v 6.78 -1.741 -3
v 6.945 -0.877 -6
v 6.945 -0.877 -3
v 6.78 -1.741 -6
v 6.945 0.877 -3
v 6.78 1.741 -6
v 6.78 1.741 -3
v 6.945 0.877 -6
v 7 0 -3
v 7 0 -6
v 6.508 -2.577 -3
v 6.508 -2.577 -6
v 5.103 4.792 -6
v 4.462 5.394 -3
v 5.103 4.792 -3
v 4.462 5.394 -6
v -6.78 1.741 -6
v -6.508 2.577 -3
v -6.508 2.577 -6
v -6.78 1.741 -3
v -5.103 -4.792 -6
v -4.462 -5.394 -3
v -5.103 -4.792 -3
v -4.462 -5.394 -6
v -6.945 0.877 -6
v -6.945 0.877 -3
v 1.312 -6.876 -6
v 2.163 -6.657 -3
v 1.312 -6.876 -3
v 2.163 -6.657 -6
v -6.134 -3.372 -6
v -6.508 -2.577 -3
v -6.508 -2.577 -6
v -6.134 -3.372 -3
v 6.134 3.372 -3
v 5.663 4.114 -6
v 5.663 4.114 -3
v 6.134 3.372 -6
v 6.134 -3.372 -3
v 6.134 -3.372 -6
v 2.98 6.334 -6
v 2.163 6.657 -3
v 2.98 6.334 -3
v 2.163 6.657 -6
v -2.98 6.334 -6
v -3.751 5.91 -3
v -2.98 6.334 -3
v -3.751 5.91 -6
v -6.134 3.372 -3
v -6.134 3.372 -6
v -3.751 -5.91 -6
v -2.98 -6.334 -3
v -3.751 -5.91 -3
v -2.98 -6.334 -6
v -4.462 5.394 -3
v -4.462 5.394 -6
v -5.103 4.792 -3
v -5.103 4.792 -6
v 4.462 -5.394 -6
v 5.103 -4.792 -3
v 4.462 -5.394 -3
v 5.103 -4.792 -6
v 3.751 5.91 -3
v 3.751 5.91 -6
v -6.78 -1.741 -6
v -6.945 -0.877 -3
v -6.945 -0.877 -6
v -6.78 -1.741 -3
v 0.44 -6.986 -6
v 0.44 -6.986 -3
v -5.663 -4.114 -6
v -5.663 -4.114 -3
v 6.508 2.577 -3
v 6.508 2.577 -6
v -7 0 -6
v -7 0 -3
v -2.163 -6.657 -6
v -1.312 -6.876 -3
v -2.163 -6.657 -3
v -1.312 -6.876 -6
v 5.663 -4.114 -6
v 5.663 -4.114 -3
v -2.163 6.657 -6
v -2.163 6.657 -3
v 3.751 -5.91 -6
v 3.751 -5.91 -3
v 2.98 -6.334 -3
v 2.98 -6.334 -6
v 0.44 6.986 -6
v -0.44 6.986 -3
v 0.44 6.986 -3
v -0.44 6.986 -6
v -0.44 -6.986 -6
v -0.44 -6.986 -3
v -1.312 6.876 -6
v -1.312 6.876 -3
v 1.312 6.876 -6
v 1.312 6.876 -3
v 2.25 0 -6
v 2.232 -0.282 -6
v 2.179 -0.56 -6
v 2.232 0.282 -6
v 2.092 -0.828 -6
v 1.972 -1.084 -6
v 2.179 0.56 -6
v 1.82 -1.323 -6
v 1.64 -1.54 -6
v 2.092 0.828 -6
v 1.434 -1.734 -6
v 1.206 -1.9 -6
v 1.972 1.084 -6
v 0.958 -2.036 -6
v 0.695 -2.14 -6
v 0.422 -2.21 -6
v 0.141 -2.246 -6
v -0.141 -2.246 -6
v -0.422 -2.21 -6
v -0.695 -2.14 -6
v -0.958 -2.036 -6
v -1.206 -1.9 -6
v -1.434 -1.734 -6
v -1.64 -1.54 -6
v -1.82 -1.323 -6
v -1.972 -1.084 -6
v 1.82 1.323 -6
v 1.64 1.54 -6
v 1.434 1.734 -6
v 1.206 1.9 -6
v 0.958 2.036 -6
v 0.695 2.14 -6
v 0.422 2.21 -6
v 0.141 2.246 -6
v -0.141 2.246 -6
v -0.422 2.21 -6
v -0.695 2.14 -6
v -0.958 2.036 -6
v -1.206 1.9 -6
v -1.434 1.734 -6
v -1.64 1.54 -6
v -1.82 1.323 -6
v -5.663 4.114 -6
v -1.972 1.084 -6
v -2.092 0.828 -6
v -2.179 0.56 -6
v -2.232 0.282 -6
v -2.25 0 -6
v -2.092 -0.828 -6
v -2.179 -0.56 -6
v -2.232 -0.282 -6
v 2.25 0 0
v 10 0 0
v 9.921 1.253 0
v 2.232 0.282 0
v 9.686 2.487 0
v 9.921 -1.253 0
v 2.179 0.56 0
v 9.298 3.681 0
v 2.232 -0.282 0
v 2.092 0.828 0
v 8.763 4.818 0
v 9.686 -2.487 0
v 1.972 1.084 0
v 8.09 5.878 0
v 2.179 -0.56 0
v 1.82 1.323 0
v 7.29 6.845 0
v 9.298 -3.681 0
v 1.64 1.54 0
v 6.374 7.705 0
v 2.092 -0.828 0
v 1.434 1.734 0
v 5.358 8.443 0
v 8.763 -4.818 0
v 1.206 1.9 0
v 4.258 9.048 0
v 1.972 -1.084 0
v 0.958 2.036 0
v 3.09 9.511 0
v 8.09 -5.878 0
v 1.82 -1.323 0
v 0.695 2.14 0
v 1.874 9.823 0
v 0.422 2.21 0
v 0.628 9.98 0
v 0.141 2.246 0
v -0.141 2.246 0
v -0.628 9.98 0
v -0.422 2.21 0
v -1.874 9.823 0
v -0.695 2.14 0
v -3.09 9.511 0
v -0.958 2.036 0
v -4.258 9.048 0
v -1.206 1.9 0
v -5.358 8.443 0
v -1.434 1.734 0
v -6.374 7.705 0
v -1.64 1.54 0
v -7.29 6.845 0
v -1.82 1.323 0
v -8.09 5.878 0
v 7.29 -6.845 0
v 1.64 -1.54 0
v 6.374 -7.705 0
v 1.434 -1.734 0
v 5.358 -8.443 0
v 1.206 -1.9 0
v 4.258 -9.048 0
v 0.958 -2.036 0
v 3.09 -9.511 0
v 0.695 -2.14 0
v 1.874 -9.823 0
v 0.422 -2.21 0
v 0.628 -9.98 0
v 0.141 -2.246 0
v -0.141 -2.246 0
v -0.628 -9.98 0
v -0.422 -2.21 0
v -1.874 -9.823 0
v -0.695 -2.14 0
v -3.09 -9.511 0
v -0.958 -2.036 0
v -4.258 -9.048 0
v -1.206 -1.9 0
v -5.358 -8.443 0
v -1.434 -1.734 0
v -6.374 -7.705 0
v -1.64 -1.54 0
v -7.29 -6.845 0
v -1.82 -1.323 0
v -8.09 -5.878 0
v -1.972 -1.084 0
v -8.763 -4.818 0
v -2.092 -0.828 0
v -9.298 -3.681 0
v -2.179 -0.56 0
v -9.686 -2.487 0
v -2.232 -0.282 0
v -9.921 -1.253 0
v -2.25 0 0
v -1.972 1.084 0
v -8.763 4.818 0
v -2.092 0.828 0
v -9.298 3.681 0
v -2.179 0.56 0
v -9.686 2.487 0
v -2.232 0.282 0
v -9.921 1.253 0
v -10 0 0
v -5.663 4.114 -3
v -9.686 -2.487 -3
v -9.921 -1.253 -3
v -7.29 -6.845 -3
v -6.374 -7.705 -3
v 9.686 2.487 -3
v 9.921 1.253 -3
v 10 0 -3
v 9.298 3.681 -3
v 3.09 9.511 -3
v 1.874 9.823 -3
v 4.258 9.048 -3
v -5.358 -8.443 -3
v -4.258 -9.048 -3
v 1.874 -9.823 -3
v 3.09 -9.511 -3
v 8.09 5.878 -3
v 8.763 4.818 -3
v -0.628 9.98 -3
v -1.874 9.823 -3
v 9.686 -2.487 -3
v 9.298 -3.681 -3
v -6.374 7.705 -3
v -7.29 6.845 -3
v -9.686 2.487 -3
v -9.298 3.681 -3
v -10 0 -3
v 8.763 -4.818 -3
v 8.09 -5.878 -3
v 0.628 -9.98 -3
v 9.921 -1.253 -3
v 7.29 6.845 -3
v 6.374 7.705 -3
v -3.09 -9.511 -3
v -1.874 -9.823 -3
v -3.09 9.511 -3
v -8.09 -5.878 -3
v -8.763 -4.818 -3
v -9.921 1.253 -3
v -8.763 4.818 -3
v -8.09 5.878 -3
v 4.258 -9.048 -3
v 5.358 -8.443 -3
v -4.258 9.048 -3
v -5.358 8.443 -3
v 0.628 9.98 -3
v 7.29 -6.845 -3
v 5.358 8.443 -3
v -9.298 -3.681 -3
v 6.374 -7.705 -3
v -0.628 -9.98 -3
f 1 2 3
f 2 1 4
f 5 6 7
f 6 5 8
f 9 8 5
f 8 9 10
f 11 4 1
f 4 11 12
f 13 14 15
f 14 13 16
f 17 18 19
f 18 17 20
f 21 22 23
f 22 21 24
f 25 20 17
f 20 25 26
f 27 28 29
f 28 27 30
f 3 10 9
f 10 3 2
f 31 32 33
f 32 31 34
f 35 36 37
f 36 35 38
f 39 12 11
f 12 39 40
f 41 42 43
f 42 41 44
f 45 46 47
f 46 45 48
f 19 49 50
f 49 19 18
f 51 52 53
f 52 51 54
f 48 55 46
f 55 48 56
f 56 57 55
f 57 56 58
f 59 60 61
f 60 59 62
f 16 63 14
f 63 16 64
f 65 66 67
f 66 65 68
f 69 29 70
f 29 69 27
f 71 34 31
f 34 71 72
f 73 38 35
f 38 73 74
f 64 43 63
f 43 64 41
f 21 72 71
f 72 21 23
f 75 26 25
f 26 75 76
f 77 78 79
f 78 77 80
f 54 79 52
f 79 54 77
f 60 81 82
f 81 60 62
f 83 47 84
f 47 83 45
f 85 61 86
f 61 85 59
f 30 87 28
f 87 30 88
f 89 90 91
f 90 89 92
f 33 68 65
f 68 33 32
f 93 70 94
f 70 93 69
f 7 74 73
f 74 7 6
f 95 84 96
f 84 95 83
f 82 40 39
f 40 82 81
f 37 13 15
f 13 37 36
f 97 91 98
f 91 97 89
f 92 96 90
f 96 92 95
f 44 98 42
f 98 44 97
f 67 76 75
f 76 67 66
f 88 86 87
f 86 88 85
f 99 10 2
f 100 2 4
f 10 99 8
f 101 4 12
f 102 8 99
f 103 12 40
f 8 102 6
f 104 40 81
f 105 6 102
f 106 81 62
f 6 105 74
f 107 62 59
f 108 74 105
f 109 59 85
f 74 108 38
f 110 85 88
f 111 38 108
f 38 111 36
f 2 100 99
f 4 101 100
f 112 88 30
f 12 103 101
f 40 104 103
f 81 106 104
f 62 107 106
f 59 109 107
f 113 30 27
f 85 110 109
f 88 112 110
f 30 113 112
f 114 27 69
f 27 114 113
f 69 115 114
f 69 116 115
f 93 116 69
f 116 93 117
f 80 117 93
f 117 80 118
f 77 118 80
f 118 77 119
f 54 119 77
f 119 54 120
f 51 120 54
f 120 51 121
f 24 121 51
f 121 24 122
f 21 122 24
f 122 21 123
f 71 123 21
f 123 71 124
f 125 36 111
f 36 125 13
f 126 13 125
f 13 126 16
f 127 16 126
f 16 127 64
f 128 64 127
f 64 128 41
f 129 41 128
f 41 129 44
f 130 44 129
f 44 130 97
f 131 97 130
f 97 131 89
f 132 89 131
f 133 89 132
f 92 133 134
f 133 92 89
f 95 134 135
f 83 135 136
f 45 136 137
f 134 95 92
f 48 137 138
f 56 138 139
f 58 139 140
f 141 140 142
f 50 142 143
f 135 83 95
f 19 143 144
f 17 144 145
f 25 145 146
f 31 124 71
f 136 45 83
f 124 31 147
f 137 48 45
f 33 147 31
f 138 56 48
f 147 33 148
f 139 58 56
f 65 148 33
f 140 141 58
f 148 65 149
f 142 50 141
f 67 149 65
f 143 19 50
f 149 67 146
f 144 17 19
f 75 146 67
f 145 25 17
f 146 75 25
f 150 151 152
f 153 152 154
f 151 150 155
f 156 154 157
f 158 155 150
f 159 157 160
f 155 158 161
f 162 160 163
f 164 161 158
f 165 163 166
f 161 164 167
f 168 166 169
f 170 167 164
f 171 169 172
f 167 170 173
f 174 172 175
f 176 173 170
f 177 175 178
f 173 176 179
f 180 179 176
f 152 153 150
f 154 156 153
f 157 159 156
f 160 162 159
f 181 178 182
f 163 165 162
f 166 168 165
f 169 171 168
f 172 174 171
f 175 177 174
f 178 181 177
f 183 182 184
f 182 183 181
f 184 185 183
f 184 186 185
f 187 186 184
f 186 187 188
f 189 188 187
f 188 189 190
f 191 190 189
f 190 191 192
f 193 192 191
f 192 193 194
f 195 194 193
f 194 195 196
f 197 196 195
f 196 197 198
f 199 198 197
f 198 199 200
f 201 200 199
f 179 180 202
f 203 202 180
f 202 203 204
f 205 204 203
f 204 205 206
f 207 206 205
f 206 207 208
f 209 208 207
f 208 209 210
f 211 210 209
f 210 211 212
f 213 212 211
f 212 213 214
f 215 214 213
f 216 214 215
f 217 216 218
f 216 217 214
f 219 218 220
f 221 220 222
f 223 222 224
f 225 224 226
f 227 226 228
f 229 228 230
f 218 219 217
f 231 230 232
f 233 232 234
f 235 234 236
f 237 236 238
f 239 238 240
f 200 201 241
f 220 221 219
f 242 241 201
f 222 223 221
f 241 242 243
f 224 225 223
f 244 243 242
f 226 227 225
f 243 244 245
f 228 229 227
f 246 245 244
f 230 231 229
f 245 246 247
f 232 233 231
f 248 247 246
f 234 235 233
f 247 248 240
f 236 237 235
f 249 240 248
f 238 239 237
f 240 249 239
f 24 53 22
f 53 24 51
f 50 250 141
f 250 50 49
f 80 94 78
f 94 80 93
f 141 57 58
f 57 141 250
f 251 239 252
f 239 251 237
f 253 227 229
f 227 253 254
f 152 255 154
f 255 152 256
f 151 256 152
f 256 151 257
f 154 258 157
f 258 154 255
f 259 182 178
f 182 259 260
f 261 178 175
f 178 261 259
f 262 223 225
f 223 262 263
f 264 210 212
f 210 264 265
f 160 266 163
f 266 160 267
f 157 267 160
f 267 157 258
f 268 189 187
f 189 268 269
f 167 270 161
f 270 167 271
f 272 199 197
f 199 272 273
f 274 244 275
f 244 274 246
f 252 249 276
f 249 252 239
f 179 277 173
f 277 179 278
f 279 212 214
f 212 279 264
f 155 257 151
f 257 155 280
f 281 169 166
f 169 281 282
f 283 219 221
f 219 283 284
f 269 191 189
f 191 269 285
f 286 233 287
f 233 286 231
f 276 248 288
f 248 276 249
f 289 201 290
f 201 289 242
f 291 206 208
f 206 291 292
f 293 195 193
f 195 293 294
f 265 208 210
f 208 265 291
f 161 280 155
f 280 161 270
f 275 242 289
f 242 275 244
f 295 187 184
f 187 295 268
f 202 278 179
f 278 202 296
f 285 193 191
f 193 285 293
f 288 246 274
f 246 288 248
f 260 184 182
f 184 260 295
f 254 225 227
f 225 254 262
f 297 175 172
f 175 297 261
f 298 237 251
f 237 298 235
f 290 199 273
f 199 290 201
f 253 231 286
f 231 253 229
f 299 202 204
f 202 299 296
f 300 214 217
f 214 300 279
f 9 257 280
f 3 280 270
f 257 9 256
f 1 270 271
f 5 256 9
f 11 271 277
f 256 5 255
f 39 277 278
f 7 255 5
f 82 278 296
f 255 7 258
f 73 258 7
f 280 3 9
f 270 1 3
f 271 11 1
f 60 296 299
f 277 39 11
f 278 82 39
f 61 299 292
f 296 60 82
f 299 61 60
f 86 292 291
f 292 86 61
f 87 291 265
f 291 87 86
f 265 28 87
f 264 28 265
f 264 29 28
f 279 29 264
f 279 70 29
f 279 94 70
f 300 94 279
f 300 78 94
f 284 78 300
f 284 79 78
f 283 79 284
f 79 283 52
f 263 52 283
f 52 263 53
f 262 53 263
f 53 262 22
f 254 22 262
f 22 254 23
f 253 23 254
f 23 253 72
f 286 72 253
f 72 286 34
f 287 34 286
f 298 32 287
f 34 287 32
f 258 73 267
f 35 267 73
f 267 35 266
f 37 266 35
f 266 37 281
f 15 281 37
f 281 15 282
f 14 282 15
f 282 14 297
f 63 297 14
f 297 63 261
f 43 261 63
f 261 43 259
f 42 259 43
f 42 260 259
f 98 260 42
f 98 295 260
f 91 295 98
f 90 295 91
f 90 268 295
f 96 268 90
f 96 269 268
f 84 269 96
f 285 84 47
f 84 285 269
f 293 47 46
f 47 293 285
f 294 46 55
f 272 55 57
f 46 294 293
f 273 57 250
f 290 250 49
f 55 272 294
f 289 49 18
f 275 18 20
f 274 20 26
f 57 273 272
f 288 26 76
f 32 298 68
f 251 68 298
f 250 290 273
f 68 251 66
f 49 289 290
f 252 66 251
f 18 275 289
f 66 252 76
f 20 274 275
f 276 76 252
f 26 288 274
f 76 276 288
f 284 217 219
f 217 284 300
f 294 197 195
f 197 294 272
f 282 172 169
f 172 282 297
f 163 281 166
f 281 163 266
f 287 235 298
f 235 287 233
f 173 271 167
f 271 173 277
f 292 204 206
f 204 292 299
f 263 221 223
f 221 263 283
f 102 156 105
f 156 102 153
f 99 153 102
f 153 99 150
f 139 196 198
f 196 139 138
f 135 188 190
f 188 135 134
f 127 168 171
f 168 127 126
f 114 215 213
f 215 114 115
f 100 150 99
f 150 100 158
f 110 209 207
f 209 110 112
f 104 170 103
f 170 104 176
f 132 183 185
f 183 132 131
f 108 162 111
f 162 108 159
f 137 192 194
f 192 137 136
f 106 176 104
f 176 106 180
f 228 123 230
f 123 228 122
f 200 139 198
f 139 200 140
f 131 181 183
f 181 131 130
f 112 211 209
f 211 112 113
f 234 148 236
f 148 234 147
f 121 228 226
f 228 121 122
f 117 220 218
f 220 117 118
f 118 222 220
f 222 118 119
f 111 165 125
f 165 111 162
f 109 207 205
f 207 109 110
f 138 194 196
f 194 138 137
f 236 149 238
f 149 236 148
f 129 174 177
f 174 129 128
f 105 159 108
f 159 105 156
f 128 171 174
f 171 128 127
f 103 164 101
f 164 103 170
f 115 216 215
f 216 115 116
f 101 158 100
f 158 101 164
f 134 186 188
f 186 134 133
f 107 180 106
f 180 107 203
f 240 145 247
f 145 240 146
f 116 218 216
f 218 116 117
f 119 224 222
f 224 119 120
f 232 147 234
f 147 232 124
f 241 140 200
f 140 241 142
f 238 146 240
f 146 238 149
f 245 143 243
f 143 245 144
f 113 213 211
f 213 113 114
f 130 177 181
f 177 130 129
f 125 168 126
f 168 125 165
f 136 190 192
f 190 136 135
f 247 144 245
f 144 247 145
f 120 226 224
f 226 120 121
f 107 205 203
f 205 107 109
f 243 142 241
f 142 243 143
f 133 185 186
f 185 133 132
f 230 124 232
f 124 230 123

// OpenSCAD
$fn = 50;


difference() {
	union() {
		translate(v = [0, 0, -6.0000000000]) {
			cylinder(h = 6, r = 7.0000000000);
		}
		translate(v = [0, 0, -3.0000000000]) {
			cylinder(h = 3, r = 10.0000000000);
		}
	}
	union() {
		#translate(v = [0, 0, -6]) {
			cylinder(h = 6, r = 2.2500000000);
		}
	}
}
